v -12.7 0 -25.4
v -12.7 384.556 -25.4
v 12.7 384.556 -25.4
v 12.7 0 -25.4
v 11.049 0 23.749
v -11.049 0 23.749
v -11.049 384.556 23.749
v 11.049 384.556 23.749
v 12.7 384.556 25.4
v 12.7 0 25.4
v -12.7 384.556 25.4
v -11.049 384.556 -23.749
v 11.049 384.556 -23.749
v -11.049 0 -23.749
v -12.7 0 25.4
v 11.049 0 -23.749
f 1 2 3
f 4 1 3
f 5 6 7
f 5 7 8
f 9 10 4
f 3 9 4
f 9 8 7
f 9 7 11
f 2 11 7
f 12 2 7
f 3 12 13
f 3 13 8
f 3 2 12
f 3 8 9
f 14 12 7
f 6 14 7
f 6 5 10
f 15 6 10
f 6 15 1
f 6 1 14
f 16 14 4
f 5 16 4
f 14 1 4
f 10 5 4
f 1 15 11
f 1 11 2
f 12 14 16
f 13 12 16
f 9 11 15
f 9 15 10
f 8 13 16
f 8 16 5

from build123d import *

# Parameters (mm, degrees)
SKETCH1_W               = 25.4
SKETCH1_H               = 50.8
BOSS_EXTRUDE1_DEPTH     = 384.556
CUT_EXTRUDE1_DEPTH      = 386.603121274
CUT_EXTRUDE1_DEPTH_BACK = 386.603121274
SKETCH2_W               = 22.098
SKETCH2_H               = 47.498


with BuildPart() as part:
    # Sketch1 → Boss-Extrude1 (new body)
    with BuildSketch(Plane(origin=(0, 0, 0), x_dir=(1, 0, 0), z_dir=(0, 1, 0))):
        Rectangle(SKETCH1_W, SKETCH1_H)
    extrude(amount=BOSS_EXTRUDE1_DEPTH)

    # Sketch2 → Cut-Extrude1 (cut, two sides: drawn at the far end of the back side and taken through both)
    with BuildSketch(Plane.XZ.offset(-CUT_EXTRUDE1_DEPTH_BACK)):
        Rectangle(SKETCH2_W, SKETCH2_H)
    extrude(amount=CUT_EXTRUDE1_DEPTH + CUT_EXTRUDE1_DEPTH_BACK, mode=Mode.SUBTRACT)


solid = part.part
